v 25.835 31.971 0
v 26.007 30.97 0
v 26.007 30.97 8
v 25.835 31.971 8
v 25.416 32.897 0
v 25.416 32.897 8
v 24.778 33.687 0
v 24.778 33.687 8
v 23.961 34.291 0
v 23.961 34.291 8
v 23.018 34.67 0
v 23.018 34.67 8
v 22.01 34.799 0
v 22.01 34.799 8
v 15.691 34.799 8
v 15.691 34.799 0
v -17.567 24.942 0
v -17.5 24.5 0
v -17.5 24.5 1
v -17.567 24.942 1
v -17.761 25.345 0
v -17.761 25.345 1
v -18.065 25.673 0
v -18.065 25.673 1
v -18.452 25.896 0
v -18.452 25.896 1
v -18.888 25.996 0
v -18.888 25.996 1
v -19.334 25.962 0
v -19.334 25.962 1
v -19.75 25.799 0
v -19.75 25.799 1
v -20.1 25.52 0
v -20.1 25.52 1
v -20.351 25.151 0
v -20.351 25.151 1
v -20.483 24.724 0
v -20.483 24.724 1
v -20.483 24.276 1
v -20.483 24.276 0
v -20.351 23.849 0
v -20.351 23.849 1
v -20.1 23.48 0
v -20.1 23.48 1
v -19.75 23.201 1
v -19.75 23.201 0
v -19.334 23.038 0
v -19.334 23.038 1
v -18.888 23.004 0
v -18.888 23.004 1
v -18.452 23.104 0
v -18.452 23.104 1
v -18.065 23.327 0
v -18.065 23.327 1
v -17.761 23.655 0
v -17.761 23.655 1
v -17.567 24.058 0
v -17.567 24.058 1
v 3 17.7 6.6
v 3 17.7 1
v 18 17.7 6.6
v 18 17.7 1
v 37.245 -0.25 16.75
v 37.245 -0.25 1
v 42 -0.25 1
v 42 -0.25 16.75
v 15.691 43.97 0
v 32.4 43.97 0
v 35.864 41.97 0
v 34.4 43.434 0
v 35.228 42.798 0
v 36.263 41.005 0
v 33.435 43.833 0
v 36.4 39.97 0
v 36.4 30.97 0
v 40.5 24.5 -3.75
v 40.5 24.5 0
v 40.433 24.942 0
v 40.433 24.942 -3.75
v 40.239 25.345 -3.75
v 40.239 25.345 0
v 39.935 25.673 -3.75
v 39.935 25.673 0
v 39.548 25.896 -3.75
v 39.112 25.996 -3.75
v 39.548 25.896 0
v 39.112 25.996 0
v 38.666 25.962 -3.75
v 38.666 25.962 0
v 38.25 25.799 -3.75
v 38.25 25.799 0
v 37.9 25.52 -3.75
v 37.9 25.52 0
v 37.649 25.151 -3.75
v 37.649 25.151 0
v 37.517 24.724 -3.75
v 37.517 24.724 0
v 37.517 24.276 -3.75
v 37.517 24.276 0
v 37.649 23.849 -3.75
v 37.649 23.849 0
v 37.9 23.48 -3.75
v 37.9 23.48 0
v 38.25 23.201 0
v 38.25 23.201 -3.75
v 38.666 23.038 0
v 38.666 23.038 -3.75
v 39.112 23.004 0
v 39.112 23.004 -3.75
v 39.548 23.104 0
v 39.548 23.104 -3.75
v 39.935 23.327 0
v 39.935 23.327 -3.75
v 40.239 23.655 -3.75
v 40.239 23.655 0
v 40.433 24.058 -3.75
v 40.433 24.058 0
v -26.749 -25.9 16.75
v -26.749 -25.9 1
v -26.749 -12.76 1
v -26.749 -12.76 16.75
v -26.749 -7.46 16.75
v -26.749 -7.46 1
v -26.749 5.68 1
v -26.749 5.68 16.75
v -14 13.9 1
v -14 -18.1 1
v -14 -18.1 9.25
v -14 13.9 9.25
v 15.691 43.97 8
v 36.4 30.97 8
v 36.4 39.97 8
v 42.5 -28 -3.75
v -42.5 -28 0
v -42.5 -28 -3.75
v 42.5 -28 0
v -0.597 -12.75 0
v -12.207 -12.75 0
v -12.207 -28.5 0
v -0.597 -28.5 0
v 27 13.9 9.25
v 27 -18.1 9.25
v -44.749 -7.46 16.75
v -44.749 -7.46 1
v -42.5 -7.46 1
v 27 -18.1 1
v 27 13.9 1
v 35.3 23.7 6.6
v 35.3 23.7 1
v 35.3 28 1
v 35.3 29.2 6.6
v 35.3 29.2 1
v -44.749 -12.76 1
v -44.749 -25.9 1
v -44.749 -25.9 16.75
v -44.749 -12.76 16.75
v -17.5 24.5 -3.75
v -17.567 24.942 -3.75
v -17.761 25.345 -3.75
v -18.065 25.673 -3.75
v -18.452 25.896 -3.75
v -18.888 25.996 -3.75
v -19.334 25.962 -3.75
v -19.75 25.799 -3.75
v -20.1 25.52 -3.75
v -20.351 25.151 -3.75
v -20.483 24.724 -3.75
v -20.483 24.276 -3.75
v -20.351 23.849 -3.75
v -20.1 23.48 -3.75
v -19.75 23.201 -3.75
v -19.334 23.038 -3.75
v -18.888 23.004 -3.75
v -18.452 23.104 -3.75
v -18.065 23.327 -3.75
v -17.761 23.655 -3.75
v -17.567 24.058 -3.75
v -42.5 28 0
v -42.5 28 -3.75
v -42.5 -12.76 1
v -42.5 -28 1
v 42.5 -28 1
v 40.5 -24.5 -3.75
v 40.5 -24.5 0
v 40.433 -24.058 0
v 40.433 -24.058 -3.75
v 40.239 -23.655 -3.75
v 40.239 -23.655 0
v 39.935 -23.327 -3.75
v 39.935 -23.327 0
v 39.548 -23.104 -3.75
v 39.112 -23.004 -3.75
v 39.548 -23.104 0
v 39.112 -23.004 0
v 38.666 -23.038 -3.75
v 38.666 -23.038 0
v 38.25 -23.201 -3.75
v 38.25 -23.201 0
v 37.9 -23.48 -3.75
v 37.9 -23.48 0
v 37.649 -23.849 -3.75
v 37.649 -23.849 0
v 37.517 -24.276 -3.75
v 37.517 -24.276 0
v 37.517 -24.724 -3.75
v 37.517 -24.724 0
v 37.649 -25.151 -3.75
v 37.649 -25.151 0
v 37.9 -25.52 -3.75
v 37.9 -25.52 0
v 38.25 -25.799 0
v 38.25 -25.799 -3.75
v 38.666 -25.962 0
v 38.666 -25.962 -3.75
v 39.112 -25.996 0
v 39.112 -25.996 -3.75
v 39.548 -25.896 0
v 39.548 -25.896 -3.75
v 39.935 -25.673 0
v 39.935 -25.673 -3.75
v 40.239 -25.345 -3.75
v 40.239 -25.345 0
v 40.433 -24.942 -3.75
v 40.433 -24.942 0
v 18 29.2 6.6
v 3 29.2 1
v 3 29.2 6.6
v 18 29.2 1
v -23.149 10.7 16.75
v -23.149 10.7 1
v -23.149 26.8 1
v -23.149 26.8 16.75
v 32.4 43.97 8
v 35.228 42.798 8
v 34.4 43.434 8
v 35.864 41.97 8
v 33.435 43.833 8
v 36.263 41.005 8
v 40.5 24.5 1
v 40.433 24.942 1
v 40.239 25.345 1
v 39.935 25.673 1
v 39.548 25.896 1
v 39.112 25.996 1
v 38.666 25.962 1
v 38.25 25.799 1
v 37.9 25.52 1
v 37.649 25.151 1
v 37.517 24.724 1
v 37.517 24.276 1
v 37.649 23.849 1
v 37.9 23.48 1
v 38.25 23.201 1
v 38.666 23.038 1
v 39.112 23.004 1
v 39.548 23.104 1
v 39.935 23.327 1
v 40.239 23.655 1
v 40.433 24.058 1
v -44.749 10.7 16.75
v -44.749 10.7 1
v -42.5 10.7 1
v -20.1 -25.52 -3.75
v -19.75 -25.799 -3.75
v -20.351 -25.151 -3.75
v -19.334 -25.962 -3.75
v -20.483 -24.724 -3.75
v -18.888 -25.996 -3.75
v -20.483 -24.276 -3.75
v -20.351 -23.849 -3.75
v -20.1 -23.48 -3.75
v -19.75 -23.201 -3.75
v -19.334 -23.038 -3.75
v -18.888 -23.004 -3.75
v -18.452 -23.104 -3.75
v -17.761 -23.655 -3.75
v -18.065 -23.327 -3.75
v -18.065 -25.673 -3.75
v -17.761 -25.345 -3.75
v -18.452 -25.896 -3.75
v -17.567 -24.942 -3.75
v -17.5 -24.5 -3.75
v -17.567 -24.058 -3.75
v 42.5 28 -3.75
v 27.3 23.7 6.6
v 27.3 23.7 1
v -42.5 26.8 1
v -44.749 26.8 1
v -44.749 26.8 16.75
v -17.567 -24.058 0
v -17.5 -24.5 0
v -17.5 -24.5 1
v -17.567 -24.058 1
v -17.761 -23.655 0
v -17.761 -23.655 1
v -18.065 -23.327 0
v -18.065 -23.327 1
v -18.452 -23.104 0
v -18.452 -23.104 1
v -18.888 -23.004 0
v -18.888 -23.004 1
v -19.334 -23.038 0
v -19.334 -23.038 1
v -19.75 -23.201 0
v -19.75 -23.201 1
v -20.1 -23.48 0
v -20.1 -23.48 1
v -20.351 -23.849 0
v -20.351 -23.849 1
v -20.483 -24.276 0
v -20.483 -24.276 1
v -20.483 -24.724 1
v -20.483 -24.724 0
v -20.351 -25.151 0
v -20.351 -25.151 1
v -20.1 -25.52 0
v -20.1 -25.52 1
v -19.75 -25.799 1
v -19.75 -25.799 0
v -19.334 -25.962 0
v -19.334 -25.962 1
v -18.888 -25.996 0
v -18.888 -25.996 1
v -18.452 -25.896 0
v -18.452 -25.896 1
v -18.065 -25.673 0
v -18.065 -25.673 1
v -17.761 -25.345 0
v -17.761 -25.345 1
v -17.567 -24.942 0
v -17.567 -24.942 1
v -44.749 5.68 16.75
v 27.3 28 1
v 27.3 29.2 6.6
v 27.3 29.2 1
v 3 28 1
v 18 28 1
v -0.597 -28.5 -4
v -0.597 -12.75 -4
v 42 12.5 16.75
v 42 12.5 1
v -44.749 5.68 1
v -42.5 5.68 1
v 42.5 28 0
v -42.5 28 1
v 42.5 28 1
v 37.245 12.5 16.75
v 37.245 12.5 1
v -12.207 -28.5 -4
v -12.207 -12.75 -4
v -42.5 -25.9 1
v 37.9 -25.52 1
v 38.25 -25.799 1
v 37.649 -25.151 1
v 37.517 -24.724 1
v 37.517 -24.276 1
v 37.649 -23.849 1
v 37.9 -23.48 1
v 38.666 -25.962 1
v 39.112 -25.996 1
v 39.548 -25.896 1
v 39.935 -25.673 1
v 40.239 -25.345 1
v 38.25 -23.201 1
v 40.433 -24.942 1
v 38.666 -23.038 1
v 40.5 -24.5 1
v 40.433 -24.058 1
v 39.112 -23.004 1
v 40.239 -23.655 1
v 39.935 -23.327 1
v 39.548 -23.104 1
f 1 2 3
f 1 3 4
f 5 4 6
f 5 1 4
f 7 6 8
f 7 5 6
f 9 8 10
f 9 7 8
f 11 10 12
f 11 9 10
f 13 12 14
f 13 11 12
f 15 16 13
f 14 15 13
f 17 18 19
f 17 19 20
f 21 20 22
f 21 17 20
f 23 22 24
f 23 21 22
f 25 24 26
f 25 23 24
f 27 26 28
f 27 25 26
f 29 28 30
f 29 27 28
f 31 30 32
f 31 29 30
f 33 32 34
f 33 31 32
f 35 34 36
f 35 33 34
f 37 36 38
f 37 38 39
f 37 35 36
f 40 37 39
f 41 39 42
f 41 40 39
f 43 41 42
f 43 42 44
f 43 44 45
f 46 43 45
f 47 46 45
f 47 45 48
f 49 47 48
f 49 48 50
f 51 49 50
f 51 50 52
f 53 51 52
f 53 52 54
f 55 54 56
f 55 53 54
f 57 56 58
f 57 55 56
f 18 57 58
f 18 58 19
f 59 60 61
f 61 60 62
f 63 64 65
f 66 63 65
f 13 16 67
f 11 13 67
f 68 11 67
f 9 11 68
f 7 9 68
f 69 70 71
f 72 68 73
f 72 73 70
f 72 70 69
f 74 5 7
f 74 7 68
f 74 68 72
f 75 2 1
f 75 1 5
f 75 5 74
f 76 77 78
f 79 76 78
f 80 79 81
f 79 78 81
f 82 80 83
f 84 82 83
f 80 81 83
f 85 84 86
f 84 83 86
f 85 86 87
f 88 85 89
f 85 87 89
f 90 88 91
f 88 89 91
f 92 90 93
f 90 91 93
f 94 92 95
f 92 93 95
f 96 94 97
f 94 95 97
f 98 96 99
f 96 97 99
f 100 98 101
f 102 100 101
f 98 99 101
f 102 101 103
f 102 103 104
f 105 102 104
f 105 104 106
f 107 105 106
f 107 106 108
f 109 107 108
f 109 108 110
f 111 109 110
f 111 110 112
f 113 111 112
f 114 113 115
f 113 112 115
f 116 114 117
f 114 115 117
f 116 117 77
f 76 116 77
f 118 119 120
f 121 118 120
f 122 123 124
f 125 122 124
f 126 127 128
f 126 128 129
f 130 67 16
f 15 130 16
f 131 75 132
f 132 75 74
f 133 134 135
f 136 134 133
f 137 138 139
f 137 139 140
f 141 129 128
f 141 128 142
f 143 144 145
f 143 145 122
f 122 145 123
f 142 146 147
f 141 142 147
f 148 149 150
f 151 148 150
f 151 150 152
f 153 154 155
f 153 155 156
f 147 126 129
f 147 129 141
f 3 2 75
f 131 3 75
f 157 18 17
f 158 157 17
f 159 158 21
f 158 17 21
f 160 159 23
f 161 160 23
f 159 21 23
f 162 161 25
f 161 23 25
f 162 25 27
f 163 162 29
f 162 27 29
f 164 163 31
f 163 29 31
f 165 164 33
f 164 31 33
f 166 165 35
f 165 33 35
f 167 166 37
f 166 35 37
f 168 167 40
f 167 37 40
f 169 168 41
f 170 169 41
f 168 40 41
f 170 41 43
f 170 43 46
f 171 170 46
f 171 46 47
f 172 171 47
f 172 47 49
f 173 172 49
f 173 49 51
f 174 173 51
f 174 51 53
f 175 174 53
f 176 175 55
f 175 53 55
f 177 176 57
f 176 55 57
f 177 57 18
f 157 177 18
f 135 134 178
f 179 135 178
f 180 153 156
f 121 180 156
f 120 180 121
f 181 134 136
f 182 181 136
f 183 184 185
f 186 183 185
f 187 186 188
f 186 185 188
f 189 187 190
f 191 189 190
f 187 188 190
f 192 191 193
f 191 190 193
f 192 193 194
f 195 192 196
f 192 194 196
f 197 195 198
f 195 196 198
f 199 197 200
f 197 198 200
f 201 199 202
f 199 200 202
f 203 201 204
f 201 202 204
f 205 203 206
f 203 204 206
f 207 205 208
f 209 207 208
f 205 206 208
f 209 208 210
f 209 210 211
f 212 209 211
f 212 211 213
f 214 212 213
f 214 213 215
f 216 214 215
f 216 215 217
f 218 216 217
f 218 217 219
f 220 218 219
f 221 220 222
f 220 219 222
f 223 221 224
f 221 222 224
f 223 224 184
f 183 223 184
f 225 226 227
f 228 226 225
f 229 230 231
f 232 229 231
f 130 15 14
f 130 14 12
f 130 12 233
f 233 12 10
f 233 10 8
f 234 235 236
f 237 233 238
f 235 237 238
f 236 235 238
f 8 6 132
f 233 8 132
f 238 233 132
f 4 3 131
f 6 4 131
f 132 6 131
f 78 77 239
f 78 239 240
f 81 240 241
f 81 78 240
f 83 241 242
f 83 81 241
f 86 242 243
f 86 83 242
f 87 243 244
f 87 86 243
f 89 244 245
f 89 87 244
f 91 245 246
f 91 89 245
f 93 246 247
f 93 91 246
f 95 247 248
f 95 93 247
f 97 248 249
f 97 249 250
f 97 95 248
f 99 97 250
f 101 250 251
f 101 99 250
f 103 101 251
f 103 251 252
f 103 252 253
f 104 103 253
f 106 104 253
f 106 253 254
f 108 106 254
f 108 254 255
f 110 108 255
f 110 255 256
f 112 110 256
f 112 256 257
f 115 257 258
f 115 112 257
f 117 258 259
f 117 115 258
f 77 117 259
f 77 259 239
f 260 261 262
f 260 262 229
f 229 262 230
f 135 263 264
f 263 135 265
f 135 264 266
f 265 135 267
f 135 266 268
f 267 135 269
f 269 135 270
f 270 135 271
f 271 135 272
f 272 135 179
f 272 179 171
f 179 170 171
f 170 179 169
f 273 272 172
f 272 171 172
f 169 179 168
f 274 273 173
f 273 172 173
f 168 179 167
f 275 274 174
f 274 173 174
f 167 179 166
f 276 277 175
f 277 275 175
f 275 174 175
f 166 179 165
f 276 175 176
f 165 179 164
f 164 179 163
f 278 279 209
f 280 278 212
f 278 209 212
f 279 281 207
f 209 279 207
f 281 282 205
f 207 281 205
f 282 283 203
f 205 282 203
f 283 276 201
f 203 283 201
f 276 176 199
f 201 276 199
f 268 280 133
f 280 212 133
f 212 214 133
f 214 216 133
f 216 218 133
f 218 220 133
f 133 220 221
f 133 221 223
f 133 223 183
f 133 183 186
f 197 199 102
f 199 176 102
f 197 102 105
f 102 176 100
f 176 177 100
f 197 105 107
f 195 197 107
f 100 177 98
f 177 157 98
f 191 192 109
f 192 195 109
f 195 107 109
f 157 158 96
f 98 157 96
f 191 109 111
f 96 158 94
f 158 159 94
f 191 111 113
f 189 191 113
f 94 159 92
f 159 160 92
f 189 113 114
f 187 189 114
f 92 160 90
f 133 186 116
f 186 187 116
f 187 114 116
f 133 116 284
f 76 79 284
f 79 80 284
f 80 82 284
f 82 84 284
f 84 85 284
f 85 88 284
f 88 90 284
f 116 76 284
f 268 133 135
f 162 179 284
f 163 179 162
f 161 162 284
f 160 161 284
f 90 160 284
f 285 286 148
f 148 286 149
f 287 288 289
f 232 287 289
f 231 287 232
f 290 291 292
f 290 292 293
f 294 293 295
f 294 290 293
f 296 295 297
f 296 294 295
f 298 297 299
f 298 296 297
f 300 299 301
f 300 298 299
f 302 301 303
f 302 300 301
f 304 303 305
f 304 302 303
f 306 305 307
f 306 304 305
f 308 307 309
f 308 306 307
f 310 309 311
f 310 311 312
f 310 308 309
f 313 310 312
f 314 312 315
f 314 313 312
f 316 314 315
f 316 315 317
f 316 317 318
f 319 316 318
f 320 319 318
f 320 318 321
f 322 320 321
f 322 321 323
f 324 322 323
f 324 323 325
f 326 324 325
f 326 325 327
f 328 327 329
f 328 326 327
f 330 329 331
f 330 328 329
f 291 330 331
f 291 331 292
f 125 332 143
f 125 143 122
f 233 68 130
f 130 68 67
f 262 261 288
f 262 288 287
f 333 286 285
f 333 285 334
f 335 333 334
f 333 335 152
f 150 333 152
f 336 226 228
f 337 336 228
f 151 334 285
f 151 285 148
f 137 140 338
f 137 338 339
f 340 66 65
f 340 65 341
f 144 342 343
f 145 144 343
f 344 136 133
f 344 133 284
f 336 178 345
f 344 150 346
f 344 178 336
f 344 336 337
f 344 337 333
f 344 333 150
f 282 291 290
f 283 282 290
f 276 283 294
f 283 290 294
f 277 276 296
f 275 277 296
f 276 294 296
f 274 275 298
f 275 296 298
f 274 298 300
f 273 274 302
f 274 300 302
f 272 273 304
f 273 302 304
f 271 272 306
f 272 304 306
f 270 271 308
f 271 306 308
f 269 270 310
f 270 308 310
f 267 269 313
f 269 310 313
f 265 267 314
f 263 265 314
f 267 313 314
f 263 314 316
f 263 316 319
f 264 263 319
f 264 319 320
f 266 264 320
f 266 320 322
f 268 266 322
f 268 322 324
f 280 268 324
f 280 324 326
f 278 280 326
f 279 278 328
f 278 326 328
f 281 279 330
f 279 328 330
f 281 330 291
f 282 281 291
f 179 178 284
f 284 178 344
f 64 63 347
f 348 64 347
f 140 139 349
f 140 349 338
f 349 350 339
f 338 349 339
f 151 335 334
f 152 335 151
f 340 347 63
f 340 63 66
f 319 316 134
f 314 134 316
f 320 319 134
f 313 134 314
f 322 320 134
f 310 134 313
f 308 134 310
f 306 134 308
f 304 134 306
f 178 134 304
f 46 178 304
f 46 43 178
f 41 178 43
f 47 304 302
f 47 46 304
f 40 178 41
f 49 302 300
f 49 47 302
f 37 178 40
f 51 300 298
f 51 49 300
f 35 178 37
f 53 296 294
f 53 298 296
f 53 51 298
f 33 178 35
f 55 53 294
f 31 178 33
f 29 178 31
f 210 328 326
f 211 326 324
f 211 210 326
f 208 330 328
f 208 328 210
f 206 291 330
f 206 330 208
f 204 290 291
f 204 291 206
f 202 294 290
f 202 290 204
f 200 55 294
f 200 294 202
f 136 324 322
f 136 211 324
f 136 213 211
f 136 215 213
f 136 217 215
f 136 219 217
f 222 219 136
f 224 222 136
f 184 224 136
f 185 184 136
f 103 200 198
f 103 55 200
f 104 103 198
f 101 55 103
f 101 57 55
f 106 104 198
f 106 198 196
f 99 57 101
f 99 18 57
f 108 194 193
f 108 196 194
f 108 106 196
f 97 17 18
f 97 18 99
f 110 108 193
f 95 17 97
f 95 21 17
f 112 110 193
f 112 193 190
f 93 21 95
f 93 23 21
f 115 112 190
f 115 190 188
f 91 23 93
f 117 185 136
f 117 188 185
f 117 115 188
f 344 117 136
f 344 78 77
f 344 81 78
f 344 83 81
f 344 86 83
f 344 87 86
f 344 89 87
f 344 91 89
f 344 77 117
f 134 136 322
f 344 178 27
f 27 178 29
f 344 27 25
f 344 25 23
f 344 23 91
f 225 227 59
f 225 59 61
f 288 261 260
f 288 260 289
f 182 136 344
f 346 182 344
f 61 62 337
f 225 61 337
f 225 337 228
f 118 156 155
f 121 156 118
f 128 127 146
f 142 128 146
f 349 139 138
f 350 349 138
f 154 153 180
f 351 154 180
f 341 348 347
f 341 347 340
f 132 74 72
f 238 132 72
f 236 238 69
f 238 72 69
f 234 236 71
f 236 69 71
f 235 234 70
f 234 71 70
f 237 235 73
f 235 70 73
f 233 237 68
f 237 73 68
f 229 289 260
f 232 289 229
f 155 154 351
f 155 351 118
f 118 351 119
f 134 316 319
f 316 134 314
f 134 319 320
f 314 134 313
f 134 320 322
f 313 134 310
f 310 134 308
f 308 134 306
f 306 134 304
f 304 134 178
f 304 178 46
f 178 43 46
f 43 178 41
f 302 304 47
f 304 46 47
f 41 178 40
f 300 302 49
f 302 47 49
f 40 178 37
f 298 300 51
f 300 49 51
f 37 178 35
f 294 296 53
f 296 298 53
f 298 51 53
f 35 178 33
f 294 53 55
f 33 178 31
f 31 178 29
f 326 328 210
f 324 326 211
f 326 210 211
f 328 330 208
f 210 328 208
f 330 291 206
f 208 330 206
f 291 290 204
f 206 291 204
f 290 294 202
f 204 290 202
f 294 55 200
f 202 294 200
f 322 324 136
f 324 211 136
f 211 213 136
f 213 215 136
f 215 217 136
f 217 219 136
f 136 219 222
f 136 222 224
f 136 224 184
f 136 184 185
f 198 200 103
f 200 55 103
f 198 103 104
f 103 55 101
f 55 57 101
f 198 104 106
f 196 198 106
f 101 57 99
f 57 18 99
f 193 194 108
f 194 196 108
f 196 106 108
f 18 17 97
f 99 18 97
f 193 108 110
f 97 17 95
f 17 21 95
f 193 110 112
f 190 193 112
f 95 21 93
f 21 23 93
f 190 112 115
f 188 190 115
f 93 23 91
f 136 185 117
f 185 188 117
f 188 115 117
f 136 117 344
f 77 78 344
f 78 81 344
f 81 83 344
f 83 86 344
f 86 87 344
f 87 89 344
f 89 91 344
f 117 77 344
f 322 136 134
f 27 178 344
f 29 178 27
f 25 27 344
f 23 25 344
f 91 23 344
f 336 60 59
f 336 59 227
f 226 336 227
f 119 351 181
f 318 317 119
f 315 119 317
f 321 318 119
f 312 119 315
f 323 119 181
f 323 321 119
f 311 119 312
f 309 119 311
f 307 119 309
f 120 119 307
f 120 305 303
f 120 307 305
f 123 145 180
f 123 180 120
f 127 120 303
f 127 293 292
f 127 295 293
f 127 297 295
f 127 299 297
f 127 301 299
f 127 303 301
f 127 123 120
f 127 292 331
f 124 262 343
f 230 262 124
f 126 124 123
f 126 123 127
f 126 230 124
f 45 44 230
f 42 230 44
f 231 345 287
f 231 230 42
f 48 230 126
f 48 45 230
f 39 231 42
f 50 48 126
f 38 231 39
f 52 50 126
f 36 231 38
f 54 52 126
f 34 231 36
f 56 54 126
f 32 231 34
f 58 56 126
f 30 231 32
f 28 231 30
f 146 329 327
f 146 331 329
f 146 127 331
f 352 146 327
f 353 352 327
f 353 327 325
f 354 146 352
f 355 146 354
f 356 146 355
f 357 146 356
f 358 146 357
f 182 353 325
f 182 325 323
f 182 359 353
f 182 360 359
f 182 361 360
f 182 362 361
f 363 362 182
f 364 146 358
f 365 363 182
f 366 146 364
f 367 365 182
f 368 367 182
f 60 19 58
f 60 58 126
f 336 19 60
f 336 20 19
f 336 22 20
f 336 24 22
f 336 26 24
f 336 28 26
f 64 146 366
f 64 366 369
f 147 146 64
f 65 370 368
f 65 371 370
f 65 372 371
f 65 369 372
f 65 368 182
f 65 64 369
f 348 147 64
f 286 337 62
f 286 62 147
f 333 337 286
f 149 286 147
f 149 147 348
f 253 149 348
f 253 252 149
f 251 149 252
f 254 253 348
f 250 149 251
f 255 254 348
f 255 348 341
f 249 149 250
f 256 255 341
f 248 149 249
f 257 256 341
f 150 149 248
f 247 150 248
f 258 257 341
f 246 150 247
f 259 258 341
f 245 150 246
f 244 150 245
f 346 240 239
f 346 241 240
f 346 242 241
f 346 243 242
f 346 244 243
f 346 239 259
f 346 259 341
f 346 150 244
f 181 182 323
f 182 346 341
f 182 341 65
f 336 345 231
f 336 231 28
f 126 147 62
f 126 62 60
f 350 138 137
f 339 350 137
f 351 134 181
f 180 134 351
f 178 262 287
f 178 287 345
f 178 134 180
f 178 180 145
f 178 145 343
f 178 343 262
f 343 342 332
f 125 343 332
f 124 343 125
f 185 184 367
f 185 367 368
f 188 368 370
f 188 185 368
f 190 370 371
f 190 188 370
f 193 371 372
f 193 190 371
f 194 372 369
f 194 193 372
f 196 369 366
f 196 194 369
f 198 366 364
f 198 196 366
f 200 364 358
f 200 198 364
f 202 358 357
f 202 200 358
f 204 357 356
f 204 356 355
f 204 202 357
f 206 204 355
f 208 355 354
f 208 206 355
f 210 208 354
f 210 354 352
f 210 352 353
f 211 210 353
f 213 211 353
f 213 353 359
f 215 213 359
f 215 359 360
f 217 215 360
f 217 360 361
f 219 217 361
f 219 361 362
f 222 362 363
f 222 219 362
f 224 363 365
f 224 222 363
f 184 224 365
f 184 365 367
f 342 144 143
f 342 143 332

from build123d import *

# Parameters (mm, degrees)
SKETCH1_W           = 85
SKETCH1_H           = 56
SKETCH1_R           = 1.5
BOSS_EXTRUDE1_DEPTH = 1
SKETCH1_2_W         = 85
SKETCH1_2_H         = 56
SKETCH1_2_R         = 1.5
BOSS_EXTRUDE2_DEPTH = 3.75
SKETCH3_W           = 41
SKETCH3_H           = 32
BOSS_EXTRUDE3_DEPTH = 8.25
SKETCH4_W           = 18
SKETCH4_H           = 13.14
SKETCH4_W_2         = 4.755
SKETCH4_H_2         = 12.75
SKETCH4_W_3         = 21.6
SKETCH4_H_3         = 16.1
BOSS_EXTRUDE4_DEPTH = 15.75
SKETCH5_W           = 15
SKETCH5_H           = 11.5
SKETCH5_W_2         = 8
SKETCH5_H_2         = 5.5
BOSS_EXTRUDE5_DEPTH = 5.6
SKETCH6_W           = 11.61
SKETCH6_H           = 15.75
BOSS_EXTRUDE6_DEPTH = 4
BOSS_EXTRUDE7_DEPTH = 8
FILLET1_R           = 4


with BuildPart() as part:
    # Sketch1 → Boss-Extrude1 (new body)
    with BuildSketch(Plane.XY):
        Rectangle(SKETCH1_W, SKETCH1_H)
        with Locations((-19.000000078, 24.5)):
            Circle(SKETCH1_R, mode=Mode.SUBTRACT)
        with Locations((-19.000000078, -24.5)):
            Circle(SKETCH1_R, mode=Mode.SUBTRACT)
        with Locations((39, 24.5)):
            Circle(SKETCH1_R, mode=Mode.SUBTRACT)
        with Locations((39, -24.5)):
            Circle(SKETCH1_R, mode=Mode.SUBTRACT)
    extrude(amount=BOSS_EXTRUDE1_DEPTH)

    # Sketch3 → Boss-Extrude3 (add)
    with BuildSketch(Plane.XY.offset(1)):
        with Locations((6.5, -2.1)):
            Rectangle(SKETCH3_W, SKETCH3_H)
    extrude(amount=BOSS_EXTRUDE3_DEPTH)

    # Sketch4 → Boss-Extrude4 (add)
    with BuildSketch(Plane.XY.offset(1)):
        with Locations((-35.74947609, -0.89)):
            Rectangle(SKETCH4_W, SKETCH4_H)
        with Locations((-35.74947609, -19.33)):
            Rectangle(SKETCH4_W, SKETCH4_H)
        with Locations((39.6225, 6.125)):
            Rectangle(SKETCH4_W_2, SKETCH4_H_2)
        with Locations((-33.94947609, 18.75)):
            Rectangle(SKETCH4_W_3, SKETCH4_H_3)
    extrude(amount=BOSS_EXTRUDE4_DEPTH)

    # Sketch5 → Boss-Extrude5 (add)
    with BuildSketch(Plane.XY.offset(1)):
        with Locations((10.5, 23.45)):
            Rectangle(SKETCH5_W, SKETCH5_H)
        with Locations((31.3, 26.45)):
            Rectangle(SKETCH5_W_2, SKETCH5_H_2)
    extrude(amount=BOSS_EXTRUDE5_DEPTH)


with BuildPart() as body_2:
    # Sketch1<2> → Boss-Extrude2 (new body)
    with BuildSketch(Plane.XY):
        Rectangle(SKETCH1_2_W, SKETCH1_2_H)
        with Locations((-19.000000078, 24.5)):
            Circle(SKETCH1_2_R, mode=Mode.SUBTRACT)
        with Locations((-19.000000078, -24.5)):
            Circle(SKETCH1_2_R, mode=Mode.SUBTRACT)
        with Locations((39, 24.5)):
            Circle(SKETCH1_2_R, mode=Mode.SUBTRACT)
        with Locations((39, -24.5)):
            Circle(SKETCH1_2_R, mode=Mode.SUBTRACT)
    extrude(amount=-BOSS_EXTRUDE2_DEPTH)


with BuildPart() as body_3:
    # Sketch6 → Boss-Extrude6 (new body)
    with BuildSketch(Plane.XY):
        with Locations((-6.401910681, -20.625)):
            Rectangle(SKETCH6_W, SKETCH6_H)
    extrude(amount=-BOSS_EXTRUDE6_DEPTH)


with BuildPart() as body_4:
    # Sketch7 → Boss-Extrude7 (new body)
    with BuildSketch(Plane.XY):
        Polygon((36.399565533, 30.969563873), (36.399565533, 43.969563873), (15.69055196, 43.969563873), (15.69055196, 34.798856494), (26.0068166, 34.798856494), (26.0068166, 30.969563873), align=None)
    extrude(amount=BOSS_EXTRUDE7_DEPTH)

    # Fillet1
    # the kernel refuses this fillet: 4 mm, written as the material it adds along each edge
    with BuildSketch(Plane(origin=(26.0068166, 34.798856494, 0), x_dir=(-1, 0, 0), z_dir=(0, 0, 1))) as fillet1_piece_1:
        with BuildLine():
            CenterArc((3.996355714, 4), FILLET1_R, 182.445945938, 87.554054062)
            Line((0, 3.829292621), (0, 0))
            Line((0, 0), (3.996355714, 0))
        make_face()
    extrude(amount=8)
    # the kernel refuses this fillet: 4 mm, written as the material it takes off along each edge
    with BuildSketch(Plane(origin=(36.399565533, 43.969563873, -10), x_dir=(0, -1, 0), z_dir=(0, 0, 1))) as fillet1_2_piece_1:
        with BuildLine():
            CenterArc((FILLET1_R, -FILLET1_R), FILLET1_R, 90, 90)
            Line((0, -FILLET1_R), (0, 0))
            Line((0, 0), (FILLET1_R, 0))
        make_face()
    extrude(amount=28, mode=Mode.SUBTRACT)


solid = Compound([part.part, body_2.part, body_3.part, body_4.part])
